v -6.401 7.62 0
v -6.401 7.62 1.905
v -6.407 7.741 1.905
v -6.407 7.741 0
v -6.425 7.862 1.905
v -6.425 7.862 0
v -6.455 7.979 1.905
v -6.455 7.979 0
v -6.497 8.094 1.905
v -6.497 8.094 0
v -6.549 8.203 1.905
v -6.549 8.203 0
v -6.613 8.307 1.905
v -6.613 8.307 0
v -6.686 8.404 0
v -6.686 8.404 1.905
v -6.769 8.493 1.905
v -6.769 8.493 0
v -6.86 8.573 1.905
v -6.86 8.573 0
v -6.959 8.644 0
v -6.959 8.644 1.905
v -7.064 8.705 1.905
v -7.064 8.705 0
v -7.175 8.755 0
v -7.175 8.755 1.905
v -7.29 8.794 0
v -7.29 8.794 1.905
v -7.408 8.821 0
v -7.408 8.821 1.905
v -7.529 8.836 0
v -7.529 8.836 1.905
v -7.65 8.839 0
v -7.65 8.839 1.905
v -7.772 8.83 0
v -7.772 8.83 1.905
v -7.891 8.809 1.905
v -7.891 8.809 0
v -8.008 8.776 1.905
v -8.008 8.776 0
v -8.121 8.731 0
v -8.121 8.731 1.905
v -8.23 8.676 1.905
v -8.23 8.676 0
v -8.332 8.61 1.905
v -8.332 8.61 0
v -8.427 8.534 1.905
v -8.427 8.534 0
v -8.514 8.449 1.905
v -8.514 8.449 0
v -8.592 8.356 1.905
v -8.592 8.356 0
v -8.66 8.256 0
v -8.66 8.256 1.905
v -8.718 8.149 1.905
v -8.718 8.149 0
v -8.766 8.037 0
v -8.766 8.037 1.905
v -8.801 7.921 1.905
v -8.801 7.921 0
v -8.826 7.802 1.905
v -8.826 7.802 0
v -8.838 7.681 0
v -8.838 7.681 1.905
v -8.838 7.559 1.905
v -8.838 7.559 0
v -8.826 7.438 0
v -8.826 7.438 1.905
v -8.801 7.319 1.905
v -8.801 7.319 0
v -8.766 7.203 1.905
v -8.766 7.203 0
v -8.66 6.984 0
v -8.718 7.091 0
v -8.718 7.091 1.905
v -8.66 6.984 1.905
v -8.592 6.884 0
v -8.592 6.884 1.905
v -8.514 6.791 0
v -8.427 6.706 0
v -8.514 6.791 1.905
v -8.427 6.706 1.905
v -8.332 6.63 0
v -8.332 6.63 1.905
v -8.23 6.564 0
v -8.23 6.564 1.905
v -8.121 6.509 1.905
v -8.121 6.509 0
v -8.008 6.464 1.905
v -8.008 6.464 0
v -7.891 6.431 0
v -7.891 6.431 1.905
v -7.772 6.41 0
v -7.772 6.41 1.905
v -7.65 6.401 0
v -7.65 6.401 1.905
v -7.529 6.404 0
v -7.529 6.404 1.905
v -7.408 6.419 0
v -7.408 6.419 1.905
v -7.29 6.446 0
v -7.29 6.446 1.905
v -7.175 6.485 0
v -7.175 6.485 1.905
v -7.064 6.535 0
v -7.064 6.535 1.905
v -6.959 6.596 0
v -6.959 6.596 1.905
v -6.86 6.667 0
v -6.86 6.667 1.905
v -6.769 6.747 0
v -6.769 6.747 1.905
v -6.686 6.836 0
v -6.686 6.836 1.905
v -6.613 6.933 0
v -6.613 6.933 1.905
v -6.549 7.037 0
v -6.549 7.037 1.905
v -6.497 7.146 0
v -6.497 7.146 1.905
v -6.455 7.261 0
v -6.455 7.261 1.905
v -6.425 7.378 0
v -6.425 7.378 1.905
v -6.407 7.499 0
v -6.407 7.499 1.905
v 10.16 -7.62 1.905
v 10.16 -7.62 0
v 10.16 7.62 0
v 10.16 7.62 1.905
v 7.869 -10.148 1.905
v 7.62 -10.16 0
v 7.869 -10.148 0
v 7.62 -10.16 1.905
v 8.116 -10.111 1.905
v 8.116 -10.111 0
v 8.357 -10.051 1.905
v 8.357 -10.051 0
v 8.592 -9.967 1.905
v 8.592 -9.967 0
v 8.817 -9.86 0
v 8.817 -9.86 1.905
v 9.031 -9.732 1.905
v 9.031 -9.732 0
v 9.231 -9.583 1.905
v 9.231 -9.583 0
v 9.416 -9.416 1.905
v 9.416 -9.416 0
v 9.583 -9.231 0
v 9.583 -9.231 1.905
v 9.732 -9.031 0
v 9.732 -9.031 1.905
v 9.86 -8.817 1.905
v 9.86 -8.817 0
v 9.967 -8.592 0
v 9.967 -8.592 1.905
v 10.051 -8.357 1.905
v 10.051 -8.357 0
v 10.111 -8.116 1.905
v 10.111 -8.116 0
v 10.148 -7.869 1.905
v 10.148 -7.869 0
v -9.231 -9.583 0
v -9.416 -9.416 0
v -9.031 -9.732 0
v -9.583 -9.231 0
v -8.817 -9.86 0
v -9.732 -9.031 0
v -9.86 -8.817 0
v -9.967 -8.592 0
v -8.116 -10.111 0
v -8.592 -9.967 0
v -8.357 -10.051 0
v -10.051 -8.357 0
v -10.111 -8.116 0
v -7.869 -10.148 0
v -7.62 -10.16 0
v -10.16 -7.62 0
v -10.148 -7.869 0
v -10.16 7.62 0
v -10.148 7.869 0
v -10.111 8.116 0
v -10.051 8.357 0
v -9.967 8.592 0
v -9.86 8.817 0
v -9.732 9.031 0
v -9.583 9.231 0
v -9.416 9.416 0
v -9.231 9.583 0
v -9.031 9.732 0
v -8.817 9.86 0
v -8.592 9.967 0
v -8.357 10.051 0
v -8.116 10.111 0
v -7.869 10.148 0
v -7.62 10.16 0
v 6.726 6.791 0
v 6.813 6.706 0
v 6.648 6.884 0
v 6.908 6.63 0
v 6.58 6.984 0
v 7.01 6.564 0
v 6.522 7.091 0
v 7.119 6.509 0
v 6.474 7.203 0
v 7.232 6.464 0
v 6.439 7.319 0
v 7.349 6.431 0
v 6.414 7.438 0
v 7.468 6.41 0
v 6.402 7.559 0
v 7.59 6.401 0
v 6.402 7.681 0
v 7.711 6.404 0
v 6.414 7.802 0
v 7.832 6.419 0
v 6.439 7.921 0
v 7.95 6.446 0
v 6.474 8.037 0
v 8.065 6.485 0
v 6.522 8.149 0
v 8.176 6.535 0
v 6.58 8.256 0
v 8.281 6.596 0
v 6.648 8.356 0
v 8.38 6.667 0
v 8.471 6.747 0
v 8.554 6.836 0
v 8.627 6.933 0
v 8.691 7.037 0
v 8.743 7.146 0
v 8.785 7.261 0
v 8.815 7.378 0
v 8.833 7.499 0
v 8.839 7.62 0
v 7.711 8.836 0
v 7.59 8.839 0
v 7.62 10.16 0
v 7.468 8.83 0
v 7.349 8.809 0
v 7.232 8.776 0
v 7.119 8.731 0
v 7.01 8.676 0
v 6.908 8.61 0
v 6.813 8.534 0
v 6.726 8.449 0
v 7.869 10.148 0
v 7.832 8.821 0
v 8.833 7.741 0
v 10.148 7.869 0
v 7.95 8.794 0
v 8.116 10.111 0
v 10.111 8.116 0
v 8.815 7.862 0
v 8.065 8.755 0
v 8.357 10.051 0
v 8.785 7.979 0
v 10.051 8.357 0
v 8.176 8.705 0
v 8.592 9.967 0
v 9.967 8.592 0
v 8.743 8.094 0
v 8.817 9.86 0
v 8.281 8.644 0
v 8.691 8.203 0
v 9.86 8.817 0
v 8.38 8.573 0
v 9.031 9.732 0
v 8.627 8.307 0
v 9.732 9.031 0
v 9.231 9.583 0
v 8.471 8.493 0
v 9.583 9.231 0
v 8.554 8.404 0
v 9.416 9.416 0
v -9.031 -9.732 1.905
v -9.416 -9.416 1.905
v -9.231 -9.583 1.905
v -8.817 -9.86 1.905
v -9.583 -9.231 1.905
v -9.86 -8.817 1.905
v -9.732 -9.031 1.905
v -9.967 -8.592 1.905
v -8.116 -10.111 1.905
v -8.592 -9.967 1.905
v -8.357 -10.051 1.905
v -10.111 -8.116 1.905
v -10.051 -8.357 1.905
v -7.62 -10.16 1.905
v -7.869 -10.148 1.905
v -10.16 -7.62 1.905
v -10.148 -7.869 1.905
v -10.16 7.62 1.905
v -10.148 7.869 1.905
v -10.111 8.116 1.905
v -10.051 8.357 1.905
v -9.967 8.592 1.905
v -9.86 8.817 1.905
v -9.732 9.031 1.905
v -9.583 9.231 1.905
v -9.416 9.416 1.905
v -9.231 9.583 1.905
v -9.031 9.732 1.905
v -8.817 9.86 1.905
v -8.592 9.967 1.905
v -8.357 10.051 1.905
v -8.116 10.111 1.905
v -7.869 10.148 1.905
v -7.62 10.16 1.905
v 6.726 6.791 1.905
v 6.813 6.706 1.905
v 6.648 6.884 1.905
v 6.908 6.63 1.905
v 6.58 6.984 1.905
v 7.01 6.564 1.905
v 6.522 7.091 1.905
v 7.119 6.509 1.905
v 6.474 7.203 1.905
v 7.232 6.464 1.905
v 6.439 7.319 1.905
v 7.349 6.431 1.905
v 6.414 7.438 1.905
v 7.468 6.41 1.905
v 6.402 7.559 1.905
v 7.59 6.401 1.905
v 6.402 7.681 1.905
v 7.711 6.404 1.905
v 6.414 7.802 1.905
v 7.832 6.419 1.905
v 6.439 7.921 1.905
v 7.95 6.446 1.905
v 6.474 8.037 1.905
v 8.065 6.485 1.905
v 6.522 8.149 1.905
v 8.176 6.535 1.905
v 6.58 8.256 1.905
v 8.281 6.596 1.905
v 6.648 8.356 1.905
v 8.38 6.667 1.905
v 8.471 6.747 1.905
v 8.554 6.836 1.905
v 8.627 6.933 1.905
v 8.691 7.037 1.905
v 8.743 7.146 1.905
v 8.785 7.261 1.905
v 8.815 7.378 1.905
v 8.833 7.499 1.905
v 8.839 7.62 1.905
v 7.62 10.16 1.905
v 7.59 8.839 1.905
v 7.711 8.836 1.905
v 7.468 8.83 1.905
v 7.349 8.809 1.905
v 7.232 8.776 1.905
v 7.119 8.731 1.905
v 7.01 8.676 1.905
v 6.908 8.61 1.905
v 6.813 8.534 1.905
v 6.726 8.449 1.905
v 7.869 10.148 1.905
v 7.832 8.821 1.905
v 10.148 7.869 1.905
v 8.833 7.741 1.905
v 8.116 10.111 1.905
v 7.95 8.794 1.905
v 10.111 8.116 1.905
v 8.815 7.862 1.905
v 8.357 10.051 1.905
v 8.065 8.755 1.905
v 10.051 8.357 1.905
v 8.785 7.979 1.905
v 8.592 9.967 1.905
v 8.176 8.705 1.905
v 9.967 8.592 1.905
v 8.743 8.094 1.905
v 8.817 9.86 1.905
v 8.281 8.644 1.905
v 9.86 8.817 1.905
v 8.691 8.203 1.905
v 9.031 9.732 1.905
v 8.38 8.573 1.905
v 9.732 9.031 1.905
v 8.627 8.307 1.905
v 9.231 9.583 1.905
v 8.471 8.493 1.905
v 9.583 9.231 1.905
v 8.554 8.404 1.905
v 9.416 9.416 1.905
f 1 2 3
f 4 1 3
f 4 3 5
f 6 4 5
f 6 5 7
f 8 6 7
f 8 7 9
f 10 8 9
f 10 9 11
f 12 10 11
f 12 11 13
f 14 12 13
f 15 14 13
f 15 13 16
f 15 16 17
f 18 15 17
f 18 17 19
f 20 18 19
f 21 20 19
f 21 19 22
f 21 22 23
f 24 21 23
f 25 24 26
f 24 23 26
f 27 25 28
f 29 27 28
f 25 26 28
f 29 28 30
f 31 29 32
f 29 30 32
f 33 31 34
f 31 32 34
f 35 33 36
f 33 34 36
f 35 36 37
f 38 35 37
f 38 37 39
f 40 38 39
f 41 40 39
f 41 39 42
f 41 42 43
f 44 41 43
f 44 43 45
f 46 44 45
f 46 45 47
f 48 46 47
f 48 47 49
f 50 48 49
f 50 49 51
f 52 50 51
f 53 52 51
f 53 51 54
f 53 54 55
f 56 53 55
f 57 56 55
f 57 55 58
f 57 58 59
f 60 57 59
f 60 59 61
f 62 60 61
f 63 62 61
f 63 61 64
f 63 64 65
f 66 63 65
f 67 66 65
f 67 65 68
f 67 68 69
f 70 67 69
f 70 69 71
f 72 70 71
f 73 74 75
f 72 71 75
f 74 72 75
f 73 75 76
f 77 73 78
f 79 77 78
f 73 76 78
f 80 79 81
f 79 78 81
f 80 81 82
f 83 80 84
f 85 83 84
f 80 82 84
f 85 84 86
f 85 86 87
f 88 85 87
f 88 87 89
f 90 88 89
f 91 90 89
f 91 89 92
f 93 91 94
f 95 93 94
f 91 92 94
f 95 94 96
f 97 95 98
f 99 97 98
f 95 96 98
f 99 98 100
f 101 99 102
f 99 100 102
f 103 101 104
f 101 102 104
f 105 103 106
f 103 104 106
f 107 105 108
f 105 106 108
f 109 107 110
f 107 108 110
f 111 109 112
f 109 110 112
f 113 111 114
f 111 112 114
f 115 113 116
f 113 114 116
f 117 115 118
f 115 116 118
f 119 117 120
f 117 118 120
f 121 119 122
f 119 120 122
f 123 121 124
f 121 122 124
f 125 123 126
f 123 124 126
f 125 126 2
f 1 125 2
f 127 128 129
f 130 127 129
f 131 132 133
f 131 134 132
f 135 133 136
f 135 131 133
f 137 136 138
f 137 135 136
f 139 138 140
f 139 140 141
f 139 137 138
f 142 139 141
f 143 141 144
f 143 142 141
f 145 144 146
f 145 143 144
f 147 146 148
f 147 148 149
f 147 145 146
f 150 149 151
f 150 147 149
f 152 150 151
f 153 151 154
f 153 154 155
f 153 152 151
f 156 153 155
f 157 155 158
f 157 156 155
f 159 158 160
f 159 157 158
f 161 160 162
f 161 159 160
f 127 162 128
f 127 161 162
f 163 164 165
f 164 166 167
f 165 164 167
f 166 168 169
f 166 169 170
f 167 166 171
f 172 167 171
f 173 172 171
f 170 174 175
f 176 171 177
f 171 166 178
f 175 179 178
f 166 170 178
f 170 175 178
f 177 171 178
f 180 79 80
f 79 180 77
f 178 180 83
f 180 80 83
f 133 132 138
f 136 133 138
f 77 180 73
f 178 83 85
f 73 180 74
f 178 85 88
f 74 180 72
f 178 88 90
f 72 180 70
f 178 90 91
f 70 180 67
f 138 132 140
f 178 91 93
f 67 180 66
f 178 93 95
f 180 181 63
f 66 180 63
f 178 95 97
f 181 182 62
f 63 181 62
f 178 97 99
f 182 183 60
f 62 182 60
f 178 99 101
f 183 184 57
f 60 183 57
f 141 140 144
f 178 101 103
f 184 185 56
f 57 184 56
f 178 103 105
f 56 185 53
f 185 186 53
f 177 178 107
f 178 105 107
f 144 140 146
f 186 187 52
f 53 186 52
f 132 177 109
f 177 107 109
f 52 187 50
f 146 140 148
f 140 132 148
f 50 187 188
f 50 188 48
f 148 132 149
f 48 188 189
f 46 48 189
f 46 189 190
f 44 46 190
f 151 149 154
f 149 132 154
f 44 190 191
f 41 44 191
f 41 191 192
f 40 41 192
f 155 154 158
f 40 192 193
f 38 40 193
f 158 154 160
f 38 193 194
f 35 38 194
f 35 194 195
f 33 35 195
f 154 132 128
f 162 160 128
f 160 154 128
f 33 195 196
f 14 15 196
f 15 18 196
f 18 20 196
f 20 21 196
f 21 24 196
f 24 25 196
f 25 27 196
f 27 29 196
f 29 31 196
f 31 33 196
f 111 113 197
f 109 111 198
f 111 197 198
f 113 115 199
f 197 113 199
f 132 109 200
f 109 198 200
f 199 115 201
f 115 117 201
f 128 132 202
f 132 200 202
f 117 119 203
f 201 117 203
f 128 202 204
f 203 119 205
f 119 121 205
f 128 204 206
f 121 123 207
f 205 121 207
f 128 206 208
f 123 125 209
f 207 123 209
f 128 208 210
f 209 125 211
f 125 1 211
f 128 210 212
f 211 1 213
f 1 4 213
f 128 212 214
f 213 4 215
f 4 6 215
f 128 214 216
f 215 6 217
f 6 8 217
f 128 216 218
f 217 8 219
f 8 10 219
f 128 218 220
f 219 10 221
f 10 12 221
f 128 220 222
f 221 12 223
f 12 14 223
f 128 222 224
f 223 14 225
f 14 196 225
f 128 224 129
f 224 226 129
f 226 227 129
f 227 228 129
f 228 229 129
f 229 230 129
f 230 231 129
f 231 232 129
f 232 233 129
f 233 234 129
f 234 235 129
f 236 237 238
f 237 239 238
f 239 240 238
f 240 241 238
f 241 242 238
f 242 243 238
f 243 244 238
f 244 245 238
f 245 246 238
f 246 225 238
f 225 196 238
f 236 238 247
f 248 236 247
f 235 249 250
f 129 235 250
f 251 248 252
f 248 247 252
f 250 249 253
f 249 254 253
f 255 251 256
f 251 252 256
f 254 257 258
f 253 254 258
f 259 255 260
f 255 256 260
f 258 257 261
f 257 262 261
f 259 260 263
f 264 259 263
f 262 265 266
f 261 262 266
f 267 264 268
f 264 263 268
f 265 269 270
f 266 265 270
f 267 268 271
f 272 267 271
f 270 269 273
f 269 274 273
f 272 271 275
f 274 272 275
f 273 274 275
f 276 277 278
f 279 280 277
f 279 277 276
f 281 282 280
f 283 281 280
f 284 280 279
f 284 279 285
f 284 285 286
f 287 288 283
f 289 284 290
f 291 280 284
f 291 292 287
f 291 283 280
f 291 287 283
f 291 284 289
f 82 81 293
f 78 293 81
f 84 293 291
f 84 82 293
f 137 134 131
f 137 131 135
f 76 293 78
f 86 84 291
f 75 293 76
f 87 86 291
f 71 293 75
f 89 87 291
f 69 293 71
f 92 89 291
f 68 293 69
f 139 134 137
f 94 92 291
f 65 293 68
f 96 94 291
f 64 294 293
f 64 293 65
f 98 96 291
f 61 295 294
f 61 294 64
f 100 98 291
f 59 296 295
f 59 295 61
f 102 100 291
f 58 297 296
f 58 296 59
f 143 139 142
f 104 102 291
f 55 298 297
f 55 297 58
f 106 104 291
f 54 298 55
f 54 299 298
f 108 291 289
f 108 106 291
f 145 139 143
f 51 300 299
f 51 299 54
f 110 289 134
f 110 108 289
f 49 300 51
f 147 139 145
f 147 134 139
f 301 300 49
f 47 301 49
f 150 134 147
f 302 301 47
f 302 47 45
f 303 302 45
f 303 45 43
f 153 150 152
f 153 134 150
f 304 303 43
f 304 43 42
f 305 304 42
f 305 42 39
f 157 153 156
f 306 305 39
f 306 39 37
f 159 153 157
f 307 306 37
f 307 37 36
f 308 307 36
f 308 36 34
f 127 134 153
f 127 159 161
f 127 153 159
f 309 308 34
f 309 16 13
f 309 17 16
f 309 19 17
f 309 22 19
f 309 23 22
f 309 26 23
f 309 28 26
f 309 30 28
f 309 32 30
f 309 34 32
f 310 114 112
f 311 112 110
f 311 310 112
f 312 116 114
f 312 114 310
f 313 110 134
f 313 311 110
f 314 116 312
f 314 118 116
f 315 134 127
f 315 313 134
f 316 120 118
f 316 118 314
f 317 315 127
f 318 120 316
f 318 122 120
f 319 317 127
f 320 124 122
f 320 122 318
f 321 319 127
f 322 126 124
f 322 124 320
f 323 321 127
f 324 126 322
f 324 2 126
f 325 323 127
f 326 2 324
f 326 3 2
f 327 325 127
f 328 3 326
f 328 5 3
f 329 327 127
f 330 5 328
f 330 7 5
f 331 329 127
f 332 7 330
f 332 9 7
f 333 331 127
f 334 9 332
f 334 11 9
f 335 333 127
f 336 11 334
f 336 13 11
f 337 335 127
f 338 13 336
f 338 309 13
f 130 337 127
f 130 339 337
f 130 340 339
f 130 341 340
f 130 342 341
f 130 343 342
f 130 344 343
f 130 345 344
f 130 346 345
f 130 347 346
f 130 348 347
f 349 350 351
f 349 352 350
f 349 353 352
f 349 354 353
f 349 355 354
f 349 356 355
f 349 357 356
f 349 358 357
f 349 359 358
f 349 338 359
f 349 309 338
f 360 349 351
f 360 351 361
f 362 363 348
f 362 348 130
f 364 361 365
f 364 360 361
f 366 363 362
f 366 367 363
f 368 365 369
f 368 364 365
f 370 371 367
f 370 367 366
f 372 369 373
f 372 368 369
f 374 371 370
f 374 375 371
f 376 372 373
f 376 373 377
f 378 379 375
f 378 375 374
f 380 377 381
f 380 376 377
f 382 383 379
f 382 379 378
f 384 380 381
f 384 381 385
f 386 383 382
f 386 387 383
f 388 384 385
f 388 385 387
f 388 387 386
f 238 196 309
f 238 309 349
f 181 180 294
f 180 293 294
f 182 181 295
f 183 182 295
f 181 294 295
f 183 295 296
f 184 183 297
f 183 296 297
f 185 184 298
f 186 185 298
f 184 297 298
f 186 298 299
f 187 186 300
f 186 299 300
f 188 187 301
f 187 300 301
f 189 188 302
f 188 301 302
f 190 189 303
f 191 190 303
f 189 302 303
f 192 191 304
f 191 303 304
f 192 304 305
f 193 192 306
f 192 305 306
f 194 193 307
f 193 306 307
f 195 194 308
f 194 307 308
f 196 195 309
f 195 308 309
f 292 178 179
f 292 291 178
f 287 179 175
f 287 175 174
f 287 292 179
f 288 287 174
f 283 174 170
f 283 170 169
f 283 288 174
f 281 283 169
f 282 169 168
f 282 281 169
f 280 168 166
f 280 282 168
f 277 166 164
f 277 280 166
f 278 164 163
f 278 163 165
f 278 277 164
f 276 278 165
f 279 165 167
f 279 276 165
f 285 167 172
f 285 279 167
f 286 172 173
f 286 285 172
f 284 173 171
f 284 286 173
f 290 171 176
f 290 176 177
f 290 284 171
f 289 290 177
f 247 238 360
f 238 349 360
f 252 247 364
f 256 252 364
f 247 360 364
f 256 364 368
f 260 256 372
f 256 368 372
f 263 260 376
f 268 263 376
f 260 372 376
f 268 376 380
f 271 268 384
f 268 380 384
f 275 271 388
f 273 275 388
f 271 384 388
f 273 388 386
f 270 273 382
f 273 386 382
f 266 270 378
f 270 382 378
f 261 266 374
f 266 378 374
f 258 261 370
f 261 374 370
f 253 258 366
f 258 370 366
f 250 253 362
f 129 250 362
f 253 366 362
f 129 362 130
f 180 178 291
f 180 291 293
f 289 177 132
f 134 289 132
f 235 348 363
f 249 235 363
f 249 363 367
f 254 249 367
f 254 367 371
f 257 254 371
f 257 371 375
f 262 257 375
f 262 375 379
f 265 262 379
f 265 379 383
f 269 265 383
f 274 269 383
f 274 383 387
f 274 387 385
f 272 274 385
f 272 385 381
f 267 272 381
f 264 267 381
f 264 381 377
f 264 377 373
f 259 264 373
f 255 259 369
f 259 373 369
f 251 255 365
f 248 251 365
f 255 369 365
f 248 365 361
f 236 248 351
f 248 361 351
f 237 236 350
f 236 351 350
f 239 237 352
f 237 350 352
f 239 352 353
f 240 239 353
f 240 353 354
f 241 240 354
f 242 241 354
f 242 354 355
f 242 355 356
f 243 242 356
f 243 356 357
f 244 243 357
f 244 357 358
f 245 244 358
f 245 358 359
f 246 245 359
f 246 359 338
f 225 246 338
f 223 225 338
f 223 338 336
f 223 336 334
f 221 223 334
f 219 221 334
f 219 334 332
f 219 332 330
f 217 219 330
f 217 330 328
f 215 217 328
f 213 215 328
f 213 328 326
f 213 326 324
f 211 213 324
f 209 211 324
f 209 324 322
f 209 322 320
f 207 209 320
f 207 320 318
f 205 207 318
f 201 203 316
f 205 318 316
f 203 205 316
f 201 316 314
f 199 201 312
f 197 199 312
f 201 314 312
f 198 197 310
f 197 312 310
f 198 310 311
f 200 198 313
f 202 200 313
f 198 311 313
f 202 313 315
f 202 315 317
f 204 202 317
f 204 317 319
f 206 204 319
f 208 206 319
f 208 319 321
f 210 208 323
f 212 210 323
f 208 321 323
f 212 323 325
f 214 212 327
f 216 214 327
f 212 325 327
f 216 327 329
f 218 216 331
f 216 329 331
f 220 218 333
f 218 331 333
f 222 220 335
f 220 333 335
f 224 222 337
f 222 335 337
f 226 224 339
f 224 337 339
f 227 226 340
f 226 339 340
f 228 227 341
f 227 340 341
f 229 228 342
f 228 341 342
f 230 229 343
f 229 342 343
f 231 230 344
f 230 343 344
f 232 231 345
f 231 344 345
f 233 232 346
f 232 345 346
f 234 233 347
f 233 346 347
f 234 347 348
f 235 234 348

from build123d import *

# Parameters (mm, degrees)
SKETCH1_W           = 20.32
SKETCH1_H           = 20.32
BOSS_EXTRUDE1_DEPTH = 1.905
CUT_EXTRUDE1_REACH  = 16.494
SKETCH2_R           = 1.2192
FILLET1_R           = 2.54


with BuildPart() as part:
    # Sketch1 → Boss-Extrude1 (new body)
    with BuildSketch(Plane.XY):
        Rectangle(SKETCH1_W, SKETCH1_H)
    extrude(amount=BOSS_EXTRUDE1_DEPTH)

    # Sketch2 → Cut-Extrude1 (cut, up to next)
    with BuildSketch(Plane.XY.offset(1.905), mode=Mode.PRIVATE) as cut_extrude1_sk1:
        with Locations((-7.62, 7.62)):
            Circle(SKETCH2_R)
    cut_extrude1_tool1 = extrude(cut_extrude1_sk1.sketch, amount=-CUT_EXTRUDE1_REACH, mode=Mode.PRIVATE) & part.part
    # Sketch2 → Cut-Extrude1 (cut, up to next)
    with BuildSketch(Plane.XY.offset(1.905), mode=Mode.PRIVATE) as cut_extrude1_sk2:
        with Locations((7.62, 7.62)):
            Circle(SKETCH2_R)
    cut_extrude1_tool2 = extrude(cut_extrude1_sk2.sketch, amount=-CUT_EXTRUDE1_REACH, mode=Mode.PRIVATE) & part.part
    add(cut_extrude1_tool1.solids().sort_by_distance((-7.62, 7.62, 1.905))[0], mode=Mode.SUBTRACT)
    add(cut_extrude1_tool2.solids().sort_by_distance((7.62, 7.62, 1.905))[0], mode=Mode.SUBTRACT)

    # Fillet1
    fillet1_edges = [part.edges().sort_by_distance(p)[0] for p in [
        (-10.16, 10.16, 0.9525),
        (10.16, 10.16, 0.9525),
        (10.16, -10.16, 0.9525),
        (-10.16, -10.16, 0.9525),
    ]]
    fillet(fillet1_edges, radius=FILLET1_R)


solid = part.part
